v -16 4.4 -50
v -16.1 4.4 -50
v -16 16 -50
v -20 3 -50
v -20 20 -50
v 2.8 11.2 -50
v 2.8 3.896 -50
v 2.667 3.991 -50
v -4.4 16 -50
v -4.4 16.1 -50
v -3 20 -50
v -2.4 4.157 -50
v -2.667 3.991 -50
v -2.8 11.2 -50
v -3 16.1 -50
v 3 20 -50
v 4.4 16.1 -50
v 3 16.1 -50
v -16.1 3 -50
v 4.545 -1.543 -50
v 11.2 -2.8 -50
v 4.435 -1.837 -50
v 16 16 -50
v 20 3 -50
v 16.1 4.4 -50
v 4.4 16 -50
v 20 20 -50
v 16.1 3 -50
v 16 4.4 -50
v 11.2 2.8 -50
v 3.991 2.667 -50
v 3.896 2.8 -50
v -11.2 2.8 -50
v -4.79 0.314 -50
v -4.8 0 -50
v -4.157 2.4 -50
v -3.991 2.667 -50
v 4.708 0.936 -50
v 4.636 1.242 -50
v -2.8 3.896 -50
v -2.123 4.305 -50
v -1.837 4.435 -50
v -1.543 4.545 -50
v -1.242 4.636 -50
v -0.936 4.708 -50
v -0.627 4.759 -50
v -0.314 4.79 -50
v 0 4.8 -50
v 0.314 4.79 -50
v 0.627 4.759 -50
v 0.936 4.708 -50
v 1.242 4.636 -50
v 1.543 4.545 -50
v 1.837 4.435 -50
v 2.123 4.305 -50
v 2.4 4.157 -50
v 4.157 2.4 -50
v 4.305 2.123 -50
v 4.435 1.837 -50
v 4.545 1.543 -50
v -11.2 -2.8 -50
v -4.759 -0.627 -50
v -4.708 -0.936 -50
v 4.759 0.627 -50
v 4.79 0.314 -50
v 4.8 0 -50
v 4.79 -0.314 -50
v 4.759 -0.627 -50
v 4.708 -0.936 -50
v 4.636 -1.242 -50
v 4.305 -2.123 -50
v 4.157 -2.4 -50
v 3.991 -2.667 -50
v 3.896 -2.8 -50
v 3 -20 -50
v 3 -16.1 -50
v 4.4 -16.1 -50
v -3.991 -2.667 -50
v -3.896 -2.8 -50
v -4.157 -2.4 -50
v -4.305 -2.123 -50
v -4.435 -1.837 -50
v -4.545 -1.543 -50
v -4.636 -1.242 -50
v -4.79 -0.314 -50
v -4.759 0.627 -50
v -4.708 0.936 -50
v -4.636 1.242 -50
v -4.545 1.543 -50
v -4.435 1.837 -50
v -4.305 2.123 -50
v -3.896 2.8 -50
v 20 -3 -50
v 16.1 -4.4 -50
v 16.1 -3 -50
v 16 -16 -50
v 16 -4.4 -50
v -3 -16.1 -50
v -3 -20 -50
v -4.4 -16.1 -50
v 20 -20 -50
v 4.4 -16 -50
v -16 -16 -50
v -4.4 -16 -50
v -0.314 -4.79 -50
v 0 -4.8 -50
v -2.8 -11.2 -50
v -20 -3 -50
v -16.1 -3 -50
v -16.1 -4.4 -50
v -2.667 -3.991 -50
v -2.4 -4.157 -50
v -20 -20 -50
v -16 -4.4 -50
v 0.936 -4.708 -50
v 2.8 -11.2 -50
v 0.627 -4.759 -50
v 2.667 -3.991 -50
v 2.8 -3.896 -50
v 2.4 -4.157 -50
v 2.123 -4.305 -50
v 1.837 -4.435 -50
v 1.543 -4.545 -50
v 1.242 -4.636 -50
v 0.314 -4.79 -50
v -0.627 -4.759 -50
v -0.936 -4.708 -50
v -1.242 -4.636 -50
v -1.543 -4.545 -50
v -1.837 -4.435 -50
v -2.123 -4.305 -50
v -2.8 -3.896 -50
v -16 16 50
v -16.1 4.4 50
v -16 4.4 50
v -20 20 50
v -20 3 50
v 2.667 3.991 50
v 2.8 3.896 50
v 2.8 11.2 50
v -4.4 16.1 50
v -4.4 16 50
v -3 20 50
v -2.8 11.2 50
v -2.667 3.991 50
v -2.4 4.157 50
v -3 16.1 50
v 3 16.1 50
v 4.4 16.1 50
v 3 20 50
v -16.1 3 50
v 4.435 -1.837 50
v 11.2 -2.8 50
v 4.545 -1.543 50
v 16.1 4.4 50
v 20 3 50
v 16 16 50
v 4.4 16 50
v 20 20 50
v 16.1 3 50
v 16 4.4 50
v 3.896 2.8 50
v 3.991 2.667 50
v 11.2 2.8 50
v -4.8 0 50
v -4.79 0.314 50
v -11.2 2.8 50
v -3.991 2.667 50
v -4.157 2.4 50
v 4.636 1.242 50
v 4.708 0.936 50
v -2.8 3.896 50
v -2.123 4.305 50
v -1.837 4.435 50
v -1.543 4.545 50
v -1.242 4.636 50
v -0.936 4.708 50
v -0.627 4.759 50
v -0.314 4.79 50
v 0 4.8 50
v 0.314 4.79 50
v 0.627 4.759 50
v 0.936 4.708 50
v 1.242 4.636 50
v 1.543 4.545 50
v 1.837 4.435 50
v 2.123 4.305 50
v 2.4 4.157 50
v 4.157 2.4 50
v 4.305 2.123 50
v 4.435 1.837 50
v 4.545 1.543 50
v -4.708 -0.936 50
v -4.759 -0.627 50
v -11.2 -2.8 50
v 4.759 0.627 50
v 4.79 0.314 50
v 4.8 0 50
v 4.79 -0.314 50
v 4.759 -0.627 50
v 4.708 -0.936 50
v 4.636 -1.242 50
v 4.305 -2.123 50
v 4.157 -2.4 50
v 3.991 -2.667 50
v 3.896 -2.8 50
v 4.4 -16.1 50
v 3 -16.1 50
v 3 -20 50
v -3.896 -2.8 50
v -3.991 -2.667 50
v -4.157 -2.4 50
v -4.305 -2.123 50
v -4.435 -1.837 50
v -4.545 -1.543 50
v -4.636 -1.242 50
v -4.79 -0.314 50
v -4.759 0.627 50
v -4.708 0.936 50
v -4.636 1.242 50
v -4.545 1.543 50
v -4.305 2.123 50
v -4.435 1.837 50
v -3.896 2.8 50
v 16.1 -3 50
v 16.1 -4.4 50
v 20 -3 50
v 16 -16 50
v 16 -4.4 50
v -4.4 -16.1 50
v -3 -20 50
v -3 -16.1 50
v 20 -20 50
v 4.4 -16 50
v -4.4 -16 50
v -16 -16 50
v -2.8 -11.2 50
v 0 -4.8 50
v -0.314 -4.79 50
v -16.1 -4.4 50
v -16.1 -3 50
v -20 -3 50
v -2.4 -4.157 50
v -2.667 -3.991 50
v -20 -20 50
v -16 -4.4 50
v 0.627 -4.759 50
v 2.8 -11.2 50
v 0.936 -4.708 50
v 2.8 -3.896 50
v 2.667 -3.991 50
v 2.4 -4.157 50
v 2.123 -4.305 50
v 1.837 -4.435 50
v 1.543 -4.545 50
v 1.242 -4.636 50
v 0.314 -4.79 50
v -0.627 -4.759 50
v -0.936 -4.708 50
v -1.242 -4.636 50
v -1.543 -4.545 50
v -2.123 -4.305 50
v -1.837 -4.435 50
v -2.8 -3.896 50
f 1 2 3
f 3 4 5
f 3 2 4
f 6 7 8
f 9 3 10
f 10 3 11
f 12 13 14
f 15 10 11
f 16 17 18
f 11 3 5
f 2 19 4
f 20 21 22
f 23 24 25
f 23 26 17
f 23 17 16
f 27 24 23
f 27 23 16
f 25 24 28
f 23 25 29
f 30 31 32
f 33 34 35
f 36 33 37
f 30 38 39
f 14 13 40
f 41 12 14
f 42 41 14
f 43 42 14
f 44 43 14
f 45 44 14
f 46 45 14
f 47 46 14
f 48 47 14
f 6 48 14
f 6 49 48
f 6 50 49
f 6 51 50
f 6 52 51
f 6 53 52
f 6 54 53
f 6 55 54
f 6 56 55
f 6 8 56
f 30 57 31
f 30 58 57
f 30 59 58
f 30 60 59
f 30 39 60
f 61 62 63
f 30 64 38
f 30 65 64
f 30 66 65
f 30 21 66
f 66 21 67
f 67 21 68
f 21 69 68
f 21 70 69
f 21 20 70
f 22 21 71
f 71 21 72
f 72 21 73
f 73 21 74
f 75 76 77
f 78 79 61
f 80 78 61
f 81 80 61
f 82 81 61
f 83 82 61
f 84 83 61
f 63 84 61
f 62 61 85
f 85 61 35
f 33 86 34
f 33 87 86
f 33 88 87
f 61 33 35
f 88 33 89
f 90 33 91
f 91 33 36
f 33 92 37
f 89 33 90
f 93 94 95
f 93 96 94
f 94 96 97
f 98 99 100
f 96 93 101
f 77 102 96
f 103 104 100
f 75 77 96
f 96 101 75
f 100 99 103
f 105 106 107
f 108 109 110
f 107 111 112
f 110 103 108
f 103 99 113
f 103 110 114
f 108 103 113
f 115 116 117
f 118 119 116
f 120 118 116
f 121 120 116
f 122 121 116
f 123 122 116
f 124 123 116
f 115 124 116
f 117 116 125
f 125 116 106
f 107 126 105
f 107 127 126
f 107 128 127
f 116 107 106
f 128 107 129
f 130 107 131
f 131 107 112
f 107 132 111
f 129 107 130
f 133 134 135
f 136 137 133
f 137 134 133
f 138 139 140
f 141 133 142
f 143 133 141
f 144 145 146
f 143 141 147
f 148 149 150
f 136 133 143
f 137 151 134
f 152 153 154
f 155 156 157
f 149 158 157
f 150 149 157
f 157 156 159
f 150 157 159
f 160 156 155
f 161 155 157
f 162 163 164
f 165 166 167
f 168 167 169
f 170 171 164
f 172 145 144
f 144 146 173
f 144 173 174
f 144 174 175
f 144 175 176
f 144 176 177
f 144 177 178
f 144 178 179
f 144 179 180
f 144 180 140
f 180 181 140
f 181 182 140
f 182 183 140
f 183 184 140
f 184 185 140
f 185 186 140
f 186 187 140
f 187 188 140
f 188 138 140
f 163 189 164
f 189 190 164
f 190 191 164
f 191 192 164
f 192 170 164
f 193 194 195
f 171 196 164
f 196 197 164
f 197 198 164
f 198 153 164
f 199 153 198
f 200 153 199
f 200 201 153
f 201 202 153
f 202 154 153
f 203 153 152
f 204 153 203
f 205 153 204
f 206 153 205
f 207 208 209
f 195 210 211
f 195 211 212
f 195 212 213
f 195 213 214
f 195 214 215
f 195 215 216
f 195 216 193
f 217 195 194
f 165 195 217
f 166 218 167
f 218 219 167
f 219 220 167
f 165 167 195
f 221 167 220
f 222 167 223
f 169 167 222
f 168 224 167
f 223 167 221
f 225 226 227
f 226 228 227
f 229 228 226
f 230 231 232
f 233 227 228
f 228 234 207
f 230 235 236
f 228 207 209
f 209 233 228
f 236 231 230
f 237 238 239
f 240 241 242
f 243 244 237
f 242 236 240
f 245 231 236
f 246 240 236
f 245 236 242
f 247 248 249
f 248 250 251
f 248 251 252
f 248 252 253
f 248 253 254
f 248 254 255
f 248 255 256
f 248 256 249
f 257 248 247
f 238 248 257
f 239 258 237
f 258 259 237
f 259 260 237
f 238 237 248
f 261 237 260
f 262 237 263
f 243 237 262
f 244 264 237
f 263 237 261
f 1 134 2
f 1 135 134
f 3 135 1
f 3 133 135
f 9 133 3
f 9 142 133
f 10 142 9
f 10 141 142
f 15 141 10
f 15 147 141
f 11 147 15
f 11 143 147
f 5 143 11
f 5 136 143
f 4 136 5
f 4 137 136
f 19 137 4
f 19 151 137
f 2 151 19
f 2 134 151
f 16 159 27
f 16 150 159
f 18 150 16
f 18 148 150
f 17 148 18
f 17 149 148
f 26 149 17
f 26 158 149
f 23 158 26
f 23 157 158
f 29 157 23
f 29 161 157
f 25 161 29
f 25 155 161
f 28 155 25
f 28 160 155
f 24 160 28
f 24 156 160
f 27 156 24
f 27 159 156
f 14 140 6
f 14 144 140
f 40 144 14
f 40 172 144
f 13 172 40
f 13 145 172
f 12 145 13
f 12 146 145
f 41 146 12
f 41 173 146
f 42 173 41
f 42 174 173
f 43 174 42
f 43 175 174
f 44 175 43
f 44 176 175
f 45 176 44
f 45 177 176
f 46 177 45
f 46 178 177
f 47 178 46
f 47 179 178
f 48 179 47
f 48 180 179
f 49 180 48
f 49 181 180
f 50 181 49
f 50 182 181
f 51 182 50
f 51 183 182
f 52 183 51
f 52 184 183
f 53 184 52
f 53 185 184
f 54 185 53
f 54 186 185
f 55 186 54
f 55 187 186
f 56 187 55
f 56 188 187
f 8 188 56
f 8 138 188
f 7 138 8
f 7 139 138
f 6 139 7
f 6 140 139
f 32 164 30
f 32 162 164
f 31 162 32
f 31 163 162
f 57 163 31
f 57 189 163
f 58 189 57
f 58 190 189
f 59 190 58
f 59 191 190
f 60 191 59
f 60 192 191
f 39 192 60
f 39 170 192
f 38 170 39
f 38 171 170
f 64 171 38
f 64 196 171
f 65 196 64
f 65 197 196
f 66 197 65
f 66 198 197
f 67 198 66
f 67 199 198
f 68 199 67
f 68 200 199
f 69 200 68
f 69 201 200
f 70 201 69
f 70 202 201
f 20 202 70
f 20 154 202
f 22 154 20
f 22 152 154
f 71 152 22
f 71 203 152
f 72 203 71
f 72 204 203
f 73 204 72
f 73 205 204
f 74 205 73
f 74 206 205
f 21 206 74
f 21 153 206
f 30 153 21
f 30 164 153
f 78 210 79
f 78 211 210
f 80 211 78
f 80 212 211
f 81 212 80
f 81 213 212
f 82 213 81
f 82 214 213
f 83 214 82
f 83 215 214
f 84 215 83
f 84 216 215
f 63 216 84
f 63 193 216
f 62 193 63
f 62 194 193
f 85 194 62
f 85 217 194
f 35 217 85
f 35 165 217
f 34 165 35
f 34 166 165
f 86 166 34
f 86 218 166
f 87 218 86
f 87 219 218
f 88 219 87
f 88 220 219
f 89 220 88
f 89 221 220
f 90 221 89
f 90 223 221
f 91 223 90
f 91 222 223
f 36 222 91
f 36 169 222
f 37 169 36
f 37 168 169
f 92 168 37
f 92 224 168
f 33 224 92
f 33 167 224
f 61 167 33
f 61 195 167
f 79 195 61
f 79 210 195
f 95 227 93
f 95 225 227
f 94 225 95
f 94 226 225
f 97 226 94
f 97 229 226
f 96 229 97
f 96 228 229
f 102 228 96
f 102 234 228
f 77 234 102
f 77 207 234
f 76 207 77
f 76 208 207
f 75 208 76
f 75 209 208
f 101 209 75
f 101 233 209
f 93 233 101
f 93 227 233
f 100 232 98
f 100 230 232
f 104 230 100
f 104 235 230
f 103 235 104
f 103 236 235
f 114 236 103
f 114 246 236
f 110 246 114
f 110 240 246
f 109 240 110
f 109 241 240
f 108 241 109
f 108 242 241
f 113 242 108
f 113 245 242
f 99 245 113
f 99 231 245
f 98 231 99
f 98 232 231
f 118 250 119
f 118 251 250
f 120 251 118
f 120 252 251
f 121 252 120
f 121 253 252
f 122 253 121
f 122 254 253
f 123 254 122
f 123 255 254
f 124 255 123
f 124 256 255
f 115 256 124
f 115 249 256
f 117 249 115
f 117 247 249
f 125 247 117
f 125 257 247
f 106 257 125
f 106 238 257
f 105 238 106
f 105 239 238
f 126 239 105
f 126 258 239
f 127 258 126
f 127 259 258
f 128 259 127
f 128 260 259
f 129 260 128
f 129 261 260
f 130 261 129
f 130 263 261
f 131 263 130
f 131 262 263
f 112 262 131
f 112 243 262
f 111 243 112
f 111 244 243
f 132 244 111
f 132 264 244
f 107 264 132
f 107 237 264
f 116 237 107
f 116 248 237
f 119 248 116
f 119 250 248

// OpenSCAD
// 40x40 aluminium extrusion profile, 100mm long (simplified 4040 T-slot style)
// ONE connected solid: outer 40x40 with T-slots and internal voids that do NOT split the body.

profile_w = 40.0;
profile_h = 40.0;
length    = 100.0;

$fn = 96;
eps = 0.05;

// Feature sizing (parametric, derived from profile size)
wall          = profile_w * 0.10;   // ~4.0 outer wall
slot_open     = profile_w * 0.15;   // ~6.0 opening at surface
slot_neck     = profile_w * 0.10;   // ~4.0 neck width
slot_depth    = profile_w * 0.22;   // ~8.8 depth from surface
slot_cavity_w = profile_w * 0.22;   // ~8.8 inner cavity width
slot_cavity_d = profile_w * 0.12;   // ~4.8 inner cavity depth
center_hole_r = profile_w * 0.12;   // ~4.8

// Keep a guaranteed connected "plus" web through the center
web = profile_w * 0.14;             // ~5.6 (thicker than before to prevent quadrant split)

// 2D cross-section (solid minus voids), then extruded along Z
module profile_2d() {
    difference() {
        // Outer boundary (40x40)
        square([profile_w, profile_h], center=true);

        // Central bore
        circle(r=center_hole_r);

        // Corner relief pockets, but clipped so they cannot cut through the central web
        pocket = profile_w * 0.18; // ~7.2
        for (sx = [-1, 1], sy = [-1, 1]) {
            translate([
                sx*(profile_w/2 - wall - pocket/2),
                sy*(profile_h/2 - wall - pocket/2)
            ])
            intersection() {
                square([pocket, pocket], center=true);
                // Keep-out region around center to preserve connectivity
                difference() {
                    square([profile_w, profile_h], center=true);
                    square([web, profile_h + 2], center=true);
                    square([profile_w + 2, web], center=true);
                }
            }
        }

        // T-slots on each side (cuts from outside inward)
        // Right
        translate([ profile_w/2 - slot_depth/2 + eps, 0])
            square([slot_depth + 2*eps, slot_open], center=true);
        translate([ profile_w/2 - slot_depth + slot_cavity_d/2 + eps, 0])
            square([slot_cavity_d + 2*eps, slot_cavity_w], center=true);
        translate([ profile_w/2 - slot_depth/2 + eps, 0])
            square([slot_depth + 2*eps, slot_neck], center=true);

        // Left
        translate([-profile_w/2 + slot_depth/2 - eps, 0])
            square([slot_depth + 2*eps, slot_open], center=true);
        translate([-profile_w/2 + slot_depth - slot_cavity_d/2 - eps, 0])
            square([slot_cavity_d + 2*eps, slot_cavity_w], center=true);
        translate([-profile_w/2 + slot_depth/2 - eps, 0])
            square([slot_depth + 2*eps, slot_neck], center=true);

        // Top
        translate([0,  profile_h/2 - slot_depth/2 + eps])
            square([slot_open, slot_depth + 2*eps], center=true);
        translate([0,  profile_h/2 - slot_depth + slot_cavity_d/2 + eps])
            square([slot_cavity_w, slot_cavity_d + 2*eps], center=true);
        translate([0,  profile_h/2 - slot_depth/2 + eps])
            square([slot_neck, slot_depth + 2*eps], center=true);

        // Bottom
        translate([0, -profile_h/2 + slot_depth/2 - eps])
            square([slot_open, slot_depth + 2*eps], center=true);
        translate([0, -profile_h/2 + slot_depth - slot_cavity_d/2 - eps])
            square([slot_cavity_w, slot_cavity_d + 2*eps], center=true);
        translate([0, -profile_h/2 + slot_depth/2 - eps])
            square([slot_neck, slot_depth + 2*eps], center=true);

        // Internal lightening voids: ONLY in the four quadrants, leaving a solid central plus-web.
        // This prevents the "four separate blocks" failure.
        quad_w = (profile_w/2 - wall) - web/2;
        quad_h = (profile_h/2 - wall) - web/2;

        if (quad_w > 1 && quad_h > 1) {
            for (sx = [-1, 1], sy = [-1, 1]) {
                translate([sx*(web/2 + quad_w/2), sy*(web/2 + quad_h/2)])
                    square([quad_w, quad_h], center=true);
            }
        }
    }
}

module extrusion_4040(len=length) {
    color("Silver")
    linear_extrude(height=len, center=true, convexity=10)
        profile_2d();
}

// Final model: 40x40 cross-section, 100mm long
extrusion_4040(length);
